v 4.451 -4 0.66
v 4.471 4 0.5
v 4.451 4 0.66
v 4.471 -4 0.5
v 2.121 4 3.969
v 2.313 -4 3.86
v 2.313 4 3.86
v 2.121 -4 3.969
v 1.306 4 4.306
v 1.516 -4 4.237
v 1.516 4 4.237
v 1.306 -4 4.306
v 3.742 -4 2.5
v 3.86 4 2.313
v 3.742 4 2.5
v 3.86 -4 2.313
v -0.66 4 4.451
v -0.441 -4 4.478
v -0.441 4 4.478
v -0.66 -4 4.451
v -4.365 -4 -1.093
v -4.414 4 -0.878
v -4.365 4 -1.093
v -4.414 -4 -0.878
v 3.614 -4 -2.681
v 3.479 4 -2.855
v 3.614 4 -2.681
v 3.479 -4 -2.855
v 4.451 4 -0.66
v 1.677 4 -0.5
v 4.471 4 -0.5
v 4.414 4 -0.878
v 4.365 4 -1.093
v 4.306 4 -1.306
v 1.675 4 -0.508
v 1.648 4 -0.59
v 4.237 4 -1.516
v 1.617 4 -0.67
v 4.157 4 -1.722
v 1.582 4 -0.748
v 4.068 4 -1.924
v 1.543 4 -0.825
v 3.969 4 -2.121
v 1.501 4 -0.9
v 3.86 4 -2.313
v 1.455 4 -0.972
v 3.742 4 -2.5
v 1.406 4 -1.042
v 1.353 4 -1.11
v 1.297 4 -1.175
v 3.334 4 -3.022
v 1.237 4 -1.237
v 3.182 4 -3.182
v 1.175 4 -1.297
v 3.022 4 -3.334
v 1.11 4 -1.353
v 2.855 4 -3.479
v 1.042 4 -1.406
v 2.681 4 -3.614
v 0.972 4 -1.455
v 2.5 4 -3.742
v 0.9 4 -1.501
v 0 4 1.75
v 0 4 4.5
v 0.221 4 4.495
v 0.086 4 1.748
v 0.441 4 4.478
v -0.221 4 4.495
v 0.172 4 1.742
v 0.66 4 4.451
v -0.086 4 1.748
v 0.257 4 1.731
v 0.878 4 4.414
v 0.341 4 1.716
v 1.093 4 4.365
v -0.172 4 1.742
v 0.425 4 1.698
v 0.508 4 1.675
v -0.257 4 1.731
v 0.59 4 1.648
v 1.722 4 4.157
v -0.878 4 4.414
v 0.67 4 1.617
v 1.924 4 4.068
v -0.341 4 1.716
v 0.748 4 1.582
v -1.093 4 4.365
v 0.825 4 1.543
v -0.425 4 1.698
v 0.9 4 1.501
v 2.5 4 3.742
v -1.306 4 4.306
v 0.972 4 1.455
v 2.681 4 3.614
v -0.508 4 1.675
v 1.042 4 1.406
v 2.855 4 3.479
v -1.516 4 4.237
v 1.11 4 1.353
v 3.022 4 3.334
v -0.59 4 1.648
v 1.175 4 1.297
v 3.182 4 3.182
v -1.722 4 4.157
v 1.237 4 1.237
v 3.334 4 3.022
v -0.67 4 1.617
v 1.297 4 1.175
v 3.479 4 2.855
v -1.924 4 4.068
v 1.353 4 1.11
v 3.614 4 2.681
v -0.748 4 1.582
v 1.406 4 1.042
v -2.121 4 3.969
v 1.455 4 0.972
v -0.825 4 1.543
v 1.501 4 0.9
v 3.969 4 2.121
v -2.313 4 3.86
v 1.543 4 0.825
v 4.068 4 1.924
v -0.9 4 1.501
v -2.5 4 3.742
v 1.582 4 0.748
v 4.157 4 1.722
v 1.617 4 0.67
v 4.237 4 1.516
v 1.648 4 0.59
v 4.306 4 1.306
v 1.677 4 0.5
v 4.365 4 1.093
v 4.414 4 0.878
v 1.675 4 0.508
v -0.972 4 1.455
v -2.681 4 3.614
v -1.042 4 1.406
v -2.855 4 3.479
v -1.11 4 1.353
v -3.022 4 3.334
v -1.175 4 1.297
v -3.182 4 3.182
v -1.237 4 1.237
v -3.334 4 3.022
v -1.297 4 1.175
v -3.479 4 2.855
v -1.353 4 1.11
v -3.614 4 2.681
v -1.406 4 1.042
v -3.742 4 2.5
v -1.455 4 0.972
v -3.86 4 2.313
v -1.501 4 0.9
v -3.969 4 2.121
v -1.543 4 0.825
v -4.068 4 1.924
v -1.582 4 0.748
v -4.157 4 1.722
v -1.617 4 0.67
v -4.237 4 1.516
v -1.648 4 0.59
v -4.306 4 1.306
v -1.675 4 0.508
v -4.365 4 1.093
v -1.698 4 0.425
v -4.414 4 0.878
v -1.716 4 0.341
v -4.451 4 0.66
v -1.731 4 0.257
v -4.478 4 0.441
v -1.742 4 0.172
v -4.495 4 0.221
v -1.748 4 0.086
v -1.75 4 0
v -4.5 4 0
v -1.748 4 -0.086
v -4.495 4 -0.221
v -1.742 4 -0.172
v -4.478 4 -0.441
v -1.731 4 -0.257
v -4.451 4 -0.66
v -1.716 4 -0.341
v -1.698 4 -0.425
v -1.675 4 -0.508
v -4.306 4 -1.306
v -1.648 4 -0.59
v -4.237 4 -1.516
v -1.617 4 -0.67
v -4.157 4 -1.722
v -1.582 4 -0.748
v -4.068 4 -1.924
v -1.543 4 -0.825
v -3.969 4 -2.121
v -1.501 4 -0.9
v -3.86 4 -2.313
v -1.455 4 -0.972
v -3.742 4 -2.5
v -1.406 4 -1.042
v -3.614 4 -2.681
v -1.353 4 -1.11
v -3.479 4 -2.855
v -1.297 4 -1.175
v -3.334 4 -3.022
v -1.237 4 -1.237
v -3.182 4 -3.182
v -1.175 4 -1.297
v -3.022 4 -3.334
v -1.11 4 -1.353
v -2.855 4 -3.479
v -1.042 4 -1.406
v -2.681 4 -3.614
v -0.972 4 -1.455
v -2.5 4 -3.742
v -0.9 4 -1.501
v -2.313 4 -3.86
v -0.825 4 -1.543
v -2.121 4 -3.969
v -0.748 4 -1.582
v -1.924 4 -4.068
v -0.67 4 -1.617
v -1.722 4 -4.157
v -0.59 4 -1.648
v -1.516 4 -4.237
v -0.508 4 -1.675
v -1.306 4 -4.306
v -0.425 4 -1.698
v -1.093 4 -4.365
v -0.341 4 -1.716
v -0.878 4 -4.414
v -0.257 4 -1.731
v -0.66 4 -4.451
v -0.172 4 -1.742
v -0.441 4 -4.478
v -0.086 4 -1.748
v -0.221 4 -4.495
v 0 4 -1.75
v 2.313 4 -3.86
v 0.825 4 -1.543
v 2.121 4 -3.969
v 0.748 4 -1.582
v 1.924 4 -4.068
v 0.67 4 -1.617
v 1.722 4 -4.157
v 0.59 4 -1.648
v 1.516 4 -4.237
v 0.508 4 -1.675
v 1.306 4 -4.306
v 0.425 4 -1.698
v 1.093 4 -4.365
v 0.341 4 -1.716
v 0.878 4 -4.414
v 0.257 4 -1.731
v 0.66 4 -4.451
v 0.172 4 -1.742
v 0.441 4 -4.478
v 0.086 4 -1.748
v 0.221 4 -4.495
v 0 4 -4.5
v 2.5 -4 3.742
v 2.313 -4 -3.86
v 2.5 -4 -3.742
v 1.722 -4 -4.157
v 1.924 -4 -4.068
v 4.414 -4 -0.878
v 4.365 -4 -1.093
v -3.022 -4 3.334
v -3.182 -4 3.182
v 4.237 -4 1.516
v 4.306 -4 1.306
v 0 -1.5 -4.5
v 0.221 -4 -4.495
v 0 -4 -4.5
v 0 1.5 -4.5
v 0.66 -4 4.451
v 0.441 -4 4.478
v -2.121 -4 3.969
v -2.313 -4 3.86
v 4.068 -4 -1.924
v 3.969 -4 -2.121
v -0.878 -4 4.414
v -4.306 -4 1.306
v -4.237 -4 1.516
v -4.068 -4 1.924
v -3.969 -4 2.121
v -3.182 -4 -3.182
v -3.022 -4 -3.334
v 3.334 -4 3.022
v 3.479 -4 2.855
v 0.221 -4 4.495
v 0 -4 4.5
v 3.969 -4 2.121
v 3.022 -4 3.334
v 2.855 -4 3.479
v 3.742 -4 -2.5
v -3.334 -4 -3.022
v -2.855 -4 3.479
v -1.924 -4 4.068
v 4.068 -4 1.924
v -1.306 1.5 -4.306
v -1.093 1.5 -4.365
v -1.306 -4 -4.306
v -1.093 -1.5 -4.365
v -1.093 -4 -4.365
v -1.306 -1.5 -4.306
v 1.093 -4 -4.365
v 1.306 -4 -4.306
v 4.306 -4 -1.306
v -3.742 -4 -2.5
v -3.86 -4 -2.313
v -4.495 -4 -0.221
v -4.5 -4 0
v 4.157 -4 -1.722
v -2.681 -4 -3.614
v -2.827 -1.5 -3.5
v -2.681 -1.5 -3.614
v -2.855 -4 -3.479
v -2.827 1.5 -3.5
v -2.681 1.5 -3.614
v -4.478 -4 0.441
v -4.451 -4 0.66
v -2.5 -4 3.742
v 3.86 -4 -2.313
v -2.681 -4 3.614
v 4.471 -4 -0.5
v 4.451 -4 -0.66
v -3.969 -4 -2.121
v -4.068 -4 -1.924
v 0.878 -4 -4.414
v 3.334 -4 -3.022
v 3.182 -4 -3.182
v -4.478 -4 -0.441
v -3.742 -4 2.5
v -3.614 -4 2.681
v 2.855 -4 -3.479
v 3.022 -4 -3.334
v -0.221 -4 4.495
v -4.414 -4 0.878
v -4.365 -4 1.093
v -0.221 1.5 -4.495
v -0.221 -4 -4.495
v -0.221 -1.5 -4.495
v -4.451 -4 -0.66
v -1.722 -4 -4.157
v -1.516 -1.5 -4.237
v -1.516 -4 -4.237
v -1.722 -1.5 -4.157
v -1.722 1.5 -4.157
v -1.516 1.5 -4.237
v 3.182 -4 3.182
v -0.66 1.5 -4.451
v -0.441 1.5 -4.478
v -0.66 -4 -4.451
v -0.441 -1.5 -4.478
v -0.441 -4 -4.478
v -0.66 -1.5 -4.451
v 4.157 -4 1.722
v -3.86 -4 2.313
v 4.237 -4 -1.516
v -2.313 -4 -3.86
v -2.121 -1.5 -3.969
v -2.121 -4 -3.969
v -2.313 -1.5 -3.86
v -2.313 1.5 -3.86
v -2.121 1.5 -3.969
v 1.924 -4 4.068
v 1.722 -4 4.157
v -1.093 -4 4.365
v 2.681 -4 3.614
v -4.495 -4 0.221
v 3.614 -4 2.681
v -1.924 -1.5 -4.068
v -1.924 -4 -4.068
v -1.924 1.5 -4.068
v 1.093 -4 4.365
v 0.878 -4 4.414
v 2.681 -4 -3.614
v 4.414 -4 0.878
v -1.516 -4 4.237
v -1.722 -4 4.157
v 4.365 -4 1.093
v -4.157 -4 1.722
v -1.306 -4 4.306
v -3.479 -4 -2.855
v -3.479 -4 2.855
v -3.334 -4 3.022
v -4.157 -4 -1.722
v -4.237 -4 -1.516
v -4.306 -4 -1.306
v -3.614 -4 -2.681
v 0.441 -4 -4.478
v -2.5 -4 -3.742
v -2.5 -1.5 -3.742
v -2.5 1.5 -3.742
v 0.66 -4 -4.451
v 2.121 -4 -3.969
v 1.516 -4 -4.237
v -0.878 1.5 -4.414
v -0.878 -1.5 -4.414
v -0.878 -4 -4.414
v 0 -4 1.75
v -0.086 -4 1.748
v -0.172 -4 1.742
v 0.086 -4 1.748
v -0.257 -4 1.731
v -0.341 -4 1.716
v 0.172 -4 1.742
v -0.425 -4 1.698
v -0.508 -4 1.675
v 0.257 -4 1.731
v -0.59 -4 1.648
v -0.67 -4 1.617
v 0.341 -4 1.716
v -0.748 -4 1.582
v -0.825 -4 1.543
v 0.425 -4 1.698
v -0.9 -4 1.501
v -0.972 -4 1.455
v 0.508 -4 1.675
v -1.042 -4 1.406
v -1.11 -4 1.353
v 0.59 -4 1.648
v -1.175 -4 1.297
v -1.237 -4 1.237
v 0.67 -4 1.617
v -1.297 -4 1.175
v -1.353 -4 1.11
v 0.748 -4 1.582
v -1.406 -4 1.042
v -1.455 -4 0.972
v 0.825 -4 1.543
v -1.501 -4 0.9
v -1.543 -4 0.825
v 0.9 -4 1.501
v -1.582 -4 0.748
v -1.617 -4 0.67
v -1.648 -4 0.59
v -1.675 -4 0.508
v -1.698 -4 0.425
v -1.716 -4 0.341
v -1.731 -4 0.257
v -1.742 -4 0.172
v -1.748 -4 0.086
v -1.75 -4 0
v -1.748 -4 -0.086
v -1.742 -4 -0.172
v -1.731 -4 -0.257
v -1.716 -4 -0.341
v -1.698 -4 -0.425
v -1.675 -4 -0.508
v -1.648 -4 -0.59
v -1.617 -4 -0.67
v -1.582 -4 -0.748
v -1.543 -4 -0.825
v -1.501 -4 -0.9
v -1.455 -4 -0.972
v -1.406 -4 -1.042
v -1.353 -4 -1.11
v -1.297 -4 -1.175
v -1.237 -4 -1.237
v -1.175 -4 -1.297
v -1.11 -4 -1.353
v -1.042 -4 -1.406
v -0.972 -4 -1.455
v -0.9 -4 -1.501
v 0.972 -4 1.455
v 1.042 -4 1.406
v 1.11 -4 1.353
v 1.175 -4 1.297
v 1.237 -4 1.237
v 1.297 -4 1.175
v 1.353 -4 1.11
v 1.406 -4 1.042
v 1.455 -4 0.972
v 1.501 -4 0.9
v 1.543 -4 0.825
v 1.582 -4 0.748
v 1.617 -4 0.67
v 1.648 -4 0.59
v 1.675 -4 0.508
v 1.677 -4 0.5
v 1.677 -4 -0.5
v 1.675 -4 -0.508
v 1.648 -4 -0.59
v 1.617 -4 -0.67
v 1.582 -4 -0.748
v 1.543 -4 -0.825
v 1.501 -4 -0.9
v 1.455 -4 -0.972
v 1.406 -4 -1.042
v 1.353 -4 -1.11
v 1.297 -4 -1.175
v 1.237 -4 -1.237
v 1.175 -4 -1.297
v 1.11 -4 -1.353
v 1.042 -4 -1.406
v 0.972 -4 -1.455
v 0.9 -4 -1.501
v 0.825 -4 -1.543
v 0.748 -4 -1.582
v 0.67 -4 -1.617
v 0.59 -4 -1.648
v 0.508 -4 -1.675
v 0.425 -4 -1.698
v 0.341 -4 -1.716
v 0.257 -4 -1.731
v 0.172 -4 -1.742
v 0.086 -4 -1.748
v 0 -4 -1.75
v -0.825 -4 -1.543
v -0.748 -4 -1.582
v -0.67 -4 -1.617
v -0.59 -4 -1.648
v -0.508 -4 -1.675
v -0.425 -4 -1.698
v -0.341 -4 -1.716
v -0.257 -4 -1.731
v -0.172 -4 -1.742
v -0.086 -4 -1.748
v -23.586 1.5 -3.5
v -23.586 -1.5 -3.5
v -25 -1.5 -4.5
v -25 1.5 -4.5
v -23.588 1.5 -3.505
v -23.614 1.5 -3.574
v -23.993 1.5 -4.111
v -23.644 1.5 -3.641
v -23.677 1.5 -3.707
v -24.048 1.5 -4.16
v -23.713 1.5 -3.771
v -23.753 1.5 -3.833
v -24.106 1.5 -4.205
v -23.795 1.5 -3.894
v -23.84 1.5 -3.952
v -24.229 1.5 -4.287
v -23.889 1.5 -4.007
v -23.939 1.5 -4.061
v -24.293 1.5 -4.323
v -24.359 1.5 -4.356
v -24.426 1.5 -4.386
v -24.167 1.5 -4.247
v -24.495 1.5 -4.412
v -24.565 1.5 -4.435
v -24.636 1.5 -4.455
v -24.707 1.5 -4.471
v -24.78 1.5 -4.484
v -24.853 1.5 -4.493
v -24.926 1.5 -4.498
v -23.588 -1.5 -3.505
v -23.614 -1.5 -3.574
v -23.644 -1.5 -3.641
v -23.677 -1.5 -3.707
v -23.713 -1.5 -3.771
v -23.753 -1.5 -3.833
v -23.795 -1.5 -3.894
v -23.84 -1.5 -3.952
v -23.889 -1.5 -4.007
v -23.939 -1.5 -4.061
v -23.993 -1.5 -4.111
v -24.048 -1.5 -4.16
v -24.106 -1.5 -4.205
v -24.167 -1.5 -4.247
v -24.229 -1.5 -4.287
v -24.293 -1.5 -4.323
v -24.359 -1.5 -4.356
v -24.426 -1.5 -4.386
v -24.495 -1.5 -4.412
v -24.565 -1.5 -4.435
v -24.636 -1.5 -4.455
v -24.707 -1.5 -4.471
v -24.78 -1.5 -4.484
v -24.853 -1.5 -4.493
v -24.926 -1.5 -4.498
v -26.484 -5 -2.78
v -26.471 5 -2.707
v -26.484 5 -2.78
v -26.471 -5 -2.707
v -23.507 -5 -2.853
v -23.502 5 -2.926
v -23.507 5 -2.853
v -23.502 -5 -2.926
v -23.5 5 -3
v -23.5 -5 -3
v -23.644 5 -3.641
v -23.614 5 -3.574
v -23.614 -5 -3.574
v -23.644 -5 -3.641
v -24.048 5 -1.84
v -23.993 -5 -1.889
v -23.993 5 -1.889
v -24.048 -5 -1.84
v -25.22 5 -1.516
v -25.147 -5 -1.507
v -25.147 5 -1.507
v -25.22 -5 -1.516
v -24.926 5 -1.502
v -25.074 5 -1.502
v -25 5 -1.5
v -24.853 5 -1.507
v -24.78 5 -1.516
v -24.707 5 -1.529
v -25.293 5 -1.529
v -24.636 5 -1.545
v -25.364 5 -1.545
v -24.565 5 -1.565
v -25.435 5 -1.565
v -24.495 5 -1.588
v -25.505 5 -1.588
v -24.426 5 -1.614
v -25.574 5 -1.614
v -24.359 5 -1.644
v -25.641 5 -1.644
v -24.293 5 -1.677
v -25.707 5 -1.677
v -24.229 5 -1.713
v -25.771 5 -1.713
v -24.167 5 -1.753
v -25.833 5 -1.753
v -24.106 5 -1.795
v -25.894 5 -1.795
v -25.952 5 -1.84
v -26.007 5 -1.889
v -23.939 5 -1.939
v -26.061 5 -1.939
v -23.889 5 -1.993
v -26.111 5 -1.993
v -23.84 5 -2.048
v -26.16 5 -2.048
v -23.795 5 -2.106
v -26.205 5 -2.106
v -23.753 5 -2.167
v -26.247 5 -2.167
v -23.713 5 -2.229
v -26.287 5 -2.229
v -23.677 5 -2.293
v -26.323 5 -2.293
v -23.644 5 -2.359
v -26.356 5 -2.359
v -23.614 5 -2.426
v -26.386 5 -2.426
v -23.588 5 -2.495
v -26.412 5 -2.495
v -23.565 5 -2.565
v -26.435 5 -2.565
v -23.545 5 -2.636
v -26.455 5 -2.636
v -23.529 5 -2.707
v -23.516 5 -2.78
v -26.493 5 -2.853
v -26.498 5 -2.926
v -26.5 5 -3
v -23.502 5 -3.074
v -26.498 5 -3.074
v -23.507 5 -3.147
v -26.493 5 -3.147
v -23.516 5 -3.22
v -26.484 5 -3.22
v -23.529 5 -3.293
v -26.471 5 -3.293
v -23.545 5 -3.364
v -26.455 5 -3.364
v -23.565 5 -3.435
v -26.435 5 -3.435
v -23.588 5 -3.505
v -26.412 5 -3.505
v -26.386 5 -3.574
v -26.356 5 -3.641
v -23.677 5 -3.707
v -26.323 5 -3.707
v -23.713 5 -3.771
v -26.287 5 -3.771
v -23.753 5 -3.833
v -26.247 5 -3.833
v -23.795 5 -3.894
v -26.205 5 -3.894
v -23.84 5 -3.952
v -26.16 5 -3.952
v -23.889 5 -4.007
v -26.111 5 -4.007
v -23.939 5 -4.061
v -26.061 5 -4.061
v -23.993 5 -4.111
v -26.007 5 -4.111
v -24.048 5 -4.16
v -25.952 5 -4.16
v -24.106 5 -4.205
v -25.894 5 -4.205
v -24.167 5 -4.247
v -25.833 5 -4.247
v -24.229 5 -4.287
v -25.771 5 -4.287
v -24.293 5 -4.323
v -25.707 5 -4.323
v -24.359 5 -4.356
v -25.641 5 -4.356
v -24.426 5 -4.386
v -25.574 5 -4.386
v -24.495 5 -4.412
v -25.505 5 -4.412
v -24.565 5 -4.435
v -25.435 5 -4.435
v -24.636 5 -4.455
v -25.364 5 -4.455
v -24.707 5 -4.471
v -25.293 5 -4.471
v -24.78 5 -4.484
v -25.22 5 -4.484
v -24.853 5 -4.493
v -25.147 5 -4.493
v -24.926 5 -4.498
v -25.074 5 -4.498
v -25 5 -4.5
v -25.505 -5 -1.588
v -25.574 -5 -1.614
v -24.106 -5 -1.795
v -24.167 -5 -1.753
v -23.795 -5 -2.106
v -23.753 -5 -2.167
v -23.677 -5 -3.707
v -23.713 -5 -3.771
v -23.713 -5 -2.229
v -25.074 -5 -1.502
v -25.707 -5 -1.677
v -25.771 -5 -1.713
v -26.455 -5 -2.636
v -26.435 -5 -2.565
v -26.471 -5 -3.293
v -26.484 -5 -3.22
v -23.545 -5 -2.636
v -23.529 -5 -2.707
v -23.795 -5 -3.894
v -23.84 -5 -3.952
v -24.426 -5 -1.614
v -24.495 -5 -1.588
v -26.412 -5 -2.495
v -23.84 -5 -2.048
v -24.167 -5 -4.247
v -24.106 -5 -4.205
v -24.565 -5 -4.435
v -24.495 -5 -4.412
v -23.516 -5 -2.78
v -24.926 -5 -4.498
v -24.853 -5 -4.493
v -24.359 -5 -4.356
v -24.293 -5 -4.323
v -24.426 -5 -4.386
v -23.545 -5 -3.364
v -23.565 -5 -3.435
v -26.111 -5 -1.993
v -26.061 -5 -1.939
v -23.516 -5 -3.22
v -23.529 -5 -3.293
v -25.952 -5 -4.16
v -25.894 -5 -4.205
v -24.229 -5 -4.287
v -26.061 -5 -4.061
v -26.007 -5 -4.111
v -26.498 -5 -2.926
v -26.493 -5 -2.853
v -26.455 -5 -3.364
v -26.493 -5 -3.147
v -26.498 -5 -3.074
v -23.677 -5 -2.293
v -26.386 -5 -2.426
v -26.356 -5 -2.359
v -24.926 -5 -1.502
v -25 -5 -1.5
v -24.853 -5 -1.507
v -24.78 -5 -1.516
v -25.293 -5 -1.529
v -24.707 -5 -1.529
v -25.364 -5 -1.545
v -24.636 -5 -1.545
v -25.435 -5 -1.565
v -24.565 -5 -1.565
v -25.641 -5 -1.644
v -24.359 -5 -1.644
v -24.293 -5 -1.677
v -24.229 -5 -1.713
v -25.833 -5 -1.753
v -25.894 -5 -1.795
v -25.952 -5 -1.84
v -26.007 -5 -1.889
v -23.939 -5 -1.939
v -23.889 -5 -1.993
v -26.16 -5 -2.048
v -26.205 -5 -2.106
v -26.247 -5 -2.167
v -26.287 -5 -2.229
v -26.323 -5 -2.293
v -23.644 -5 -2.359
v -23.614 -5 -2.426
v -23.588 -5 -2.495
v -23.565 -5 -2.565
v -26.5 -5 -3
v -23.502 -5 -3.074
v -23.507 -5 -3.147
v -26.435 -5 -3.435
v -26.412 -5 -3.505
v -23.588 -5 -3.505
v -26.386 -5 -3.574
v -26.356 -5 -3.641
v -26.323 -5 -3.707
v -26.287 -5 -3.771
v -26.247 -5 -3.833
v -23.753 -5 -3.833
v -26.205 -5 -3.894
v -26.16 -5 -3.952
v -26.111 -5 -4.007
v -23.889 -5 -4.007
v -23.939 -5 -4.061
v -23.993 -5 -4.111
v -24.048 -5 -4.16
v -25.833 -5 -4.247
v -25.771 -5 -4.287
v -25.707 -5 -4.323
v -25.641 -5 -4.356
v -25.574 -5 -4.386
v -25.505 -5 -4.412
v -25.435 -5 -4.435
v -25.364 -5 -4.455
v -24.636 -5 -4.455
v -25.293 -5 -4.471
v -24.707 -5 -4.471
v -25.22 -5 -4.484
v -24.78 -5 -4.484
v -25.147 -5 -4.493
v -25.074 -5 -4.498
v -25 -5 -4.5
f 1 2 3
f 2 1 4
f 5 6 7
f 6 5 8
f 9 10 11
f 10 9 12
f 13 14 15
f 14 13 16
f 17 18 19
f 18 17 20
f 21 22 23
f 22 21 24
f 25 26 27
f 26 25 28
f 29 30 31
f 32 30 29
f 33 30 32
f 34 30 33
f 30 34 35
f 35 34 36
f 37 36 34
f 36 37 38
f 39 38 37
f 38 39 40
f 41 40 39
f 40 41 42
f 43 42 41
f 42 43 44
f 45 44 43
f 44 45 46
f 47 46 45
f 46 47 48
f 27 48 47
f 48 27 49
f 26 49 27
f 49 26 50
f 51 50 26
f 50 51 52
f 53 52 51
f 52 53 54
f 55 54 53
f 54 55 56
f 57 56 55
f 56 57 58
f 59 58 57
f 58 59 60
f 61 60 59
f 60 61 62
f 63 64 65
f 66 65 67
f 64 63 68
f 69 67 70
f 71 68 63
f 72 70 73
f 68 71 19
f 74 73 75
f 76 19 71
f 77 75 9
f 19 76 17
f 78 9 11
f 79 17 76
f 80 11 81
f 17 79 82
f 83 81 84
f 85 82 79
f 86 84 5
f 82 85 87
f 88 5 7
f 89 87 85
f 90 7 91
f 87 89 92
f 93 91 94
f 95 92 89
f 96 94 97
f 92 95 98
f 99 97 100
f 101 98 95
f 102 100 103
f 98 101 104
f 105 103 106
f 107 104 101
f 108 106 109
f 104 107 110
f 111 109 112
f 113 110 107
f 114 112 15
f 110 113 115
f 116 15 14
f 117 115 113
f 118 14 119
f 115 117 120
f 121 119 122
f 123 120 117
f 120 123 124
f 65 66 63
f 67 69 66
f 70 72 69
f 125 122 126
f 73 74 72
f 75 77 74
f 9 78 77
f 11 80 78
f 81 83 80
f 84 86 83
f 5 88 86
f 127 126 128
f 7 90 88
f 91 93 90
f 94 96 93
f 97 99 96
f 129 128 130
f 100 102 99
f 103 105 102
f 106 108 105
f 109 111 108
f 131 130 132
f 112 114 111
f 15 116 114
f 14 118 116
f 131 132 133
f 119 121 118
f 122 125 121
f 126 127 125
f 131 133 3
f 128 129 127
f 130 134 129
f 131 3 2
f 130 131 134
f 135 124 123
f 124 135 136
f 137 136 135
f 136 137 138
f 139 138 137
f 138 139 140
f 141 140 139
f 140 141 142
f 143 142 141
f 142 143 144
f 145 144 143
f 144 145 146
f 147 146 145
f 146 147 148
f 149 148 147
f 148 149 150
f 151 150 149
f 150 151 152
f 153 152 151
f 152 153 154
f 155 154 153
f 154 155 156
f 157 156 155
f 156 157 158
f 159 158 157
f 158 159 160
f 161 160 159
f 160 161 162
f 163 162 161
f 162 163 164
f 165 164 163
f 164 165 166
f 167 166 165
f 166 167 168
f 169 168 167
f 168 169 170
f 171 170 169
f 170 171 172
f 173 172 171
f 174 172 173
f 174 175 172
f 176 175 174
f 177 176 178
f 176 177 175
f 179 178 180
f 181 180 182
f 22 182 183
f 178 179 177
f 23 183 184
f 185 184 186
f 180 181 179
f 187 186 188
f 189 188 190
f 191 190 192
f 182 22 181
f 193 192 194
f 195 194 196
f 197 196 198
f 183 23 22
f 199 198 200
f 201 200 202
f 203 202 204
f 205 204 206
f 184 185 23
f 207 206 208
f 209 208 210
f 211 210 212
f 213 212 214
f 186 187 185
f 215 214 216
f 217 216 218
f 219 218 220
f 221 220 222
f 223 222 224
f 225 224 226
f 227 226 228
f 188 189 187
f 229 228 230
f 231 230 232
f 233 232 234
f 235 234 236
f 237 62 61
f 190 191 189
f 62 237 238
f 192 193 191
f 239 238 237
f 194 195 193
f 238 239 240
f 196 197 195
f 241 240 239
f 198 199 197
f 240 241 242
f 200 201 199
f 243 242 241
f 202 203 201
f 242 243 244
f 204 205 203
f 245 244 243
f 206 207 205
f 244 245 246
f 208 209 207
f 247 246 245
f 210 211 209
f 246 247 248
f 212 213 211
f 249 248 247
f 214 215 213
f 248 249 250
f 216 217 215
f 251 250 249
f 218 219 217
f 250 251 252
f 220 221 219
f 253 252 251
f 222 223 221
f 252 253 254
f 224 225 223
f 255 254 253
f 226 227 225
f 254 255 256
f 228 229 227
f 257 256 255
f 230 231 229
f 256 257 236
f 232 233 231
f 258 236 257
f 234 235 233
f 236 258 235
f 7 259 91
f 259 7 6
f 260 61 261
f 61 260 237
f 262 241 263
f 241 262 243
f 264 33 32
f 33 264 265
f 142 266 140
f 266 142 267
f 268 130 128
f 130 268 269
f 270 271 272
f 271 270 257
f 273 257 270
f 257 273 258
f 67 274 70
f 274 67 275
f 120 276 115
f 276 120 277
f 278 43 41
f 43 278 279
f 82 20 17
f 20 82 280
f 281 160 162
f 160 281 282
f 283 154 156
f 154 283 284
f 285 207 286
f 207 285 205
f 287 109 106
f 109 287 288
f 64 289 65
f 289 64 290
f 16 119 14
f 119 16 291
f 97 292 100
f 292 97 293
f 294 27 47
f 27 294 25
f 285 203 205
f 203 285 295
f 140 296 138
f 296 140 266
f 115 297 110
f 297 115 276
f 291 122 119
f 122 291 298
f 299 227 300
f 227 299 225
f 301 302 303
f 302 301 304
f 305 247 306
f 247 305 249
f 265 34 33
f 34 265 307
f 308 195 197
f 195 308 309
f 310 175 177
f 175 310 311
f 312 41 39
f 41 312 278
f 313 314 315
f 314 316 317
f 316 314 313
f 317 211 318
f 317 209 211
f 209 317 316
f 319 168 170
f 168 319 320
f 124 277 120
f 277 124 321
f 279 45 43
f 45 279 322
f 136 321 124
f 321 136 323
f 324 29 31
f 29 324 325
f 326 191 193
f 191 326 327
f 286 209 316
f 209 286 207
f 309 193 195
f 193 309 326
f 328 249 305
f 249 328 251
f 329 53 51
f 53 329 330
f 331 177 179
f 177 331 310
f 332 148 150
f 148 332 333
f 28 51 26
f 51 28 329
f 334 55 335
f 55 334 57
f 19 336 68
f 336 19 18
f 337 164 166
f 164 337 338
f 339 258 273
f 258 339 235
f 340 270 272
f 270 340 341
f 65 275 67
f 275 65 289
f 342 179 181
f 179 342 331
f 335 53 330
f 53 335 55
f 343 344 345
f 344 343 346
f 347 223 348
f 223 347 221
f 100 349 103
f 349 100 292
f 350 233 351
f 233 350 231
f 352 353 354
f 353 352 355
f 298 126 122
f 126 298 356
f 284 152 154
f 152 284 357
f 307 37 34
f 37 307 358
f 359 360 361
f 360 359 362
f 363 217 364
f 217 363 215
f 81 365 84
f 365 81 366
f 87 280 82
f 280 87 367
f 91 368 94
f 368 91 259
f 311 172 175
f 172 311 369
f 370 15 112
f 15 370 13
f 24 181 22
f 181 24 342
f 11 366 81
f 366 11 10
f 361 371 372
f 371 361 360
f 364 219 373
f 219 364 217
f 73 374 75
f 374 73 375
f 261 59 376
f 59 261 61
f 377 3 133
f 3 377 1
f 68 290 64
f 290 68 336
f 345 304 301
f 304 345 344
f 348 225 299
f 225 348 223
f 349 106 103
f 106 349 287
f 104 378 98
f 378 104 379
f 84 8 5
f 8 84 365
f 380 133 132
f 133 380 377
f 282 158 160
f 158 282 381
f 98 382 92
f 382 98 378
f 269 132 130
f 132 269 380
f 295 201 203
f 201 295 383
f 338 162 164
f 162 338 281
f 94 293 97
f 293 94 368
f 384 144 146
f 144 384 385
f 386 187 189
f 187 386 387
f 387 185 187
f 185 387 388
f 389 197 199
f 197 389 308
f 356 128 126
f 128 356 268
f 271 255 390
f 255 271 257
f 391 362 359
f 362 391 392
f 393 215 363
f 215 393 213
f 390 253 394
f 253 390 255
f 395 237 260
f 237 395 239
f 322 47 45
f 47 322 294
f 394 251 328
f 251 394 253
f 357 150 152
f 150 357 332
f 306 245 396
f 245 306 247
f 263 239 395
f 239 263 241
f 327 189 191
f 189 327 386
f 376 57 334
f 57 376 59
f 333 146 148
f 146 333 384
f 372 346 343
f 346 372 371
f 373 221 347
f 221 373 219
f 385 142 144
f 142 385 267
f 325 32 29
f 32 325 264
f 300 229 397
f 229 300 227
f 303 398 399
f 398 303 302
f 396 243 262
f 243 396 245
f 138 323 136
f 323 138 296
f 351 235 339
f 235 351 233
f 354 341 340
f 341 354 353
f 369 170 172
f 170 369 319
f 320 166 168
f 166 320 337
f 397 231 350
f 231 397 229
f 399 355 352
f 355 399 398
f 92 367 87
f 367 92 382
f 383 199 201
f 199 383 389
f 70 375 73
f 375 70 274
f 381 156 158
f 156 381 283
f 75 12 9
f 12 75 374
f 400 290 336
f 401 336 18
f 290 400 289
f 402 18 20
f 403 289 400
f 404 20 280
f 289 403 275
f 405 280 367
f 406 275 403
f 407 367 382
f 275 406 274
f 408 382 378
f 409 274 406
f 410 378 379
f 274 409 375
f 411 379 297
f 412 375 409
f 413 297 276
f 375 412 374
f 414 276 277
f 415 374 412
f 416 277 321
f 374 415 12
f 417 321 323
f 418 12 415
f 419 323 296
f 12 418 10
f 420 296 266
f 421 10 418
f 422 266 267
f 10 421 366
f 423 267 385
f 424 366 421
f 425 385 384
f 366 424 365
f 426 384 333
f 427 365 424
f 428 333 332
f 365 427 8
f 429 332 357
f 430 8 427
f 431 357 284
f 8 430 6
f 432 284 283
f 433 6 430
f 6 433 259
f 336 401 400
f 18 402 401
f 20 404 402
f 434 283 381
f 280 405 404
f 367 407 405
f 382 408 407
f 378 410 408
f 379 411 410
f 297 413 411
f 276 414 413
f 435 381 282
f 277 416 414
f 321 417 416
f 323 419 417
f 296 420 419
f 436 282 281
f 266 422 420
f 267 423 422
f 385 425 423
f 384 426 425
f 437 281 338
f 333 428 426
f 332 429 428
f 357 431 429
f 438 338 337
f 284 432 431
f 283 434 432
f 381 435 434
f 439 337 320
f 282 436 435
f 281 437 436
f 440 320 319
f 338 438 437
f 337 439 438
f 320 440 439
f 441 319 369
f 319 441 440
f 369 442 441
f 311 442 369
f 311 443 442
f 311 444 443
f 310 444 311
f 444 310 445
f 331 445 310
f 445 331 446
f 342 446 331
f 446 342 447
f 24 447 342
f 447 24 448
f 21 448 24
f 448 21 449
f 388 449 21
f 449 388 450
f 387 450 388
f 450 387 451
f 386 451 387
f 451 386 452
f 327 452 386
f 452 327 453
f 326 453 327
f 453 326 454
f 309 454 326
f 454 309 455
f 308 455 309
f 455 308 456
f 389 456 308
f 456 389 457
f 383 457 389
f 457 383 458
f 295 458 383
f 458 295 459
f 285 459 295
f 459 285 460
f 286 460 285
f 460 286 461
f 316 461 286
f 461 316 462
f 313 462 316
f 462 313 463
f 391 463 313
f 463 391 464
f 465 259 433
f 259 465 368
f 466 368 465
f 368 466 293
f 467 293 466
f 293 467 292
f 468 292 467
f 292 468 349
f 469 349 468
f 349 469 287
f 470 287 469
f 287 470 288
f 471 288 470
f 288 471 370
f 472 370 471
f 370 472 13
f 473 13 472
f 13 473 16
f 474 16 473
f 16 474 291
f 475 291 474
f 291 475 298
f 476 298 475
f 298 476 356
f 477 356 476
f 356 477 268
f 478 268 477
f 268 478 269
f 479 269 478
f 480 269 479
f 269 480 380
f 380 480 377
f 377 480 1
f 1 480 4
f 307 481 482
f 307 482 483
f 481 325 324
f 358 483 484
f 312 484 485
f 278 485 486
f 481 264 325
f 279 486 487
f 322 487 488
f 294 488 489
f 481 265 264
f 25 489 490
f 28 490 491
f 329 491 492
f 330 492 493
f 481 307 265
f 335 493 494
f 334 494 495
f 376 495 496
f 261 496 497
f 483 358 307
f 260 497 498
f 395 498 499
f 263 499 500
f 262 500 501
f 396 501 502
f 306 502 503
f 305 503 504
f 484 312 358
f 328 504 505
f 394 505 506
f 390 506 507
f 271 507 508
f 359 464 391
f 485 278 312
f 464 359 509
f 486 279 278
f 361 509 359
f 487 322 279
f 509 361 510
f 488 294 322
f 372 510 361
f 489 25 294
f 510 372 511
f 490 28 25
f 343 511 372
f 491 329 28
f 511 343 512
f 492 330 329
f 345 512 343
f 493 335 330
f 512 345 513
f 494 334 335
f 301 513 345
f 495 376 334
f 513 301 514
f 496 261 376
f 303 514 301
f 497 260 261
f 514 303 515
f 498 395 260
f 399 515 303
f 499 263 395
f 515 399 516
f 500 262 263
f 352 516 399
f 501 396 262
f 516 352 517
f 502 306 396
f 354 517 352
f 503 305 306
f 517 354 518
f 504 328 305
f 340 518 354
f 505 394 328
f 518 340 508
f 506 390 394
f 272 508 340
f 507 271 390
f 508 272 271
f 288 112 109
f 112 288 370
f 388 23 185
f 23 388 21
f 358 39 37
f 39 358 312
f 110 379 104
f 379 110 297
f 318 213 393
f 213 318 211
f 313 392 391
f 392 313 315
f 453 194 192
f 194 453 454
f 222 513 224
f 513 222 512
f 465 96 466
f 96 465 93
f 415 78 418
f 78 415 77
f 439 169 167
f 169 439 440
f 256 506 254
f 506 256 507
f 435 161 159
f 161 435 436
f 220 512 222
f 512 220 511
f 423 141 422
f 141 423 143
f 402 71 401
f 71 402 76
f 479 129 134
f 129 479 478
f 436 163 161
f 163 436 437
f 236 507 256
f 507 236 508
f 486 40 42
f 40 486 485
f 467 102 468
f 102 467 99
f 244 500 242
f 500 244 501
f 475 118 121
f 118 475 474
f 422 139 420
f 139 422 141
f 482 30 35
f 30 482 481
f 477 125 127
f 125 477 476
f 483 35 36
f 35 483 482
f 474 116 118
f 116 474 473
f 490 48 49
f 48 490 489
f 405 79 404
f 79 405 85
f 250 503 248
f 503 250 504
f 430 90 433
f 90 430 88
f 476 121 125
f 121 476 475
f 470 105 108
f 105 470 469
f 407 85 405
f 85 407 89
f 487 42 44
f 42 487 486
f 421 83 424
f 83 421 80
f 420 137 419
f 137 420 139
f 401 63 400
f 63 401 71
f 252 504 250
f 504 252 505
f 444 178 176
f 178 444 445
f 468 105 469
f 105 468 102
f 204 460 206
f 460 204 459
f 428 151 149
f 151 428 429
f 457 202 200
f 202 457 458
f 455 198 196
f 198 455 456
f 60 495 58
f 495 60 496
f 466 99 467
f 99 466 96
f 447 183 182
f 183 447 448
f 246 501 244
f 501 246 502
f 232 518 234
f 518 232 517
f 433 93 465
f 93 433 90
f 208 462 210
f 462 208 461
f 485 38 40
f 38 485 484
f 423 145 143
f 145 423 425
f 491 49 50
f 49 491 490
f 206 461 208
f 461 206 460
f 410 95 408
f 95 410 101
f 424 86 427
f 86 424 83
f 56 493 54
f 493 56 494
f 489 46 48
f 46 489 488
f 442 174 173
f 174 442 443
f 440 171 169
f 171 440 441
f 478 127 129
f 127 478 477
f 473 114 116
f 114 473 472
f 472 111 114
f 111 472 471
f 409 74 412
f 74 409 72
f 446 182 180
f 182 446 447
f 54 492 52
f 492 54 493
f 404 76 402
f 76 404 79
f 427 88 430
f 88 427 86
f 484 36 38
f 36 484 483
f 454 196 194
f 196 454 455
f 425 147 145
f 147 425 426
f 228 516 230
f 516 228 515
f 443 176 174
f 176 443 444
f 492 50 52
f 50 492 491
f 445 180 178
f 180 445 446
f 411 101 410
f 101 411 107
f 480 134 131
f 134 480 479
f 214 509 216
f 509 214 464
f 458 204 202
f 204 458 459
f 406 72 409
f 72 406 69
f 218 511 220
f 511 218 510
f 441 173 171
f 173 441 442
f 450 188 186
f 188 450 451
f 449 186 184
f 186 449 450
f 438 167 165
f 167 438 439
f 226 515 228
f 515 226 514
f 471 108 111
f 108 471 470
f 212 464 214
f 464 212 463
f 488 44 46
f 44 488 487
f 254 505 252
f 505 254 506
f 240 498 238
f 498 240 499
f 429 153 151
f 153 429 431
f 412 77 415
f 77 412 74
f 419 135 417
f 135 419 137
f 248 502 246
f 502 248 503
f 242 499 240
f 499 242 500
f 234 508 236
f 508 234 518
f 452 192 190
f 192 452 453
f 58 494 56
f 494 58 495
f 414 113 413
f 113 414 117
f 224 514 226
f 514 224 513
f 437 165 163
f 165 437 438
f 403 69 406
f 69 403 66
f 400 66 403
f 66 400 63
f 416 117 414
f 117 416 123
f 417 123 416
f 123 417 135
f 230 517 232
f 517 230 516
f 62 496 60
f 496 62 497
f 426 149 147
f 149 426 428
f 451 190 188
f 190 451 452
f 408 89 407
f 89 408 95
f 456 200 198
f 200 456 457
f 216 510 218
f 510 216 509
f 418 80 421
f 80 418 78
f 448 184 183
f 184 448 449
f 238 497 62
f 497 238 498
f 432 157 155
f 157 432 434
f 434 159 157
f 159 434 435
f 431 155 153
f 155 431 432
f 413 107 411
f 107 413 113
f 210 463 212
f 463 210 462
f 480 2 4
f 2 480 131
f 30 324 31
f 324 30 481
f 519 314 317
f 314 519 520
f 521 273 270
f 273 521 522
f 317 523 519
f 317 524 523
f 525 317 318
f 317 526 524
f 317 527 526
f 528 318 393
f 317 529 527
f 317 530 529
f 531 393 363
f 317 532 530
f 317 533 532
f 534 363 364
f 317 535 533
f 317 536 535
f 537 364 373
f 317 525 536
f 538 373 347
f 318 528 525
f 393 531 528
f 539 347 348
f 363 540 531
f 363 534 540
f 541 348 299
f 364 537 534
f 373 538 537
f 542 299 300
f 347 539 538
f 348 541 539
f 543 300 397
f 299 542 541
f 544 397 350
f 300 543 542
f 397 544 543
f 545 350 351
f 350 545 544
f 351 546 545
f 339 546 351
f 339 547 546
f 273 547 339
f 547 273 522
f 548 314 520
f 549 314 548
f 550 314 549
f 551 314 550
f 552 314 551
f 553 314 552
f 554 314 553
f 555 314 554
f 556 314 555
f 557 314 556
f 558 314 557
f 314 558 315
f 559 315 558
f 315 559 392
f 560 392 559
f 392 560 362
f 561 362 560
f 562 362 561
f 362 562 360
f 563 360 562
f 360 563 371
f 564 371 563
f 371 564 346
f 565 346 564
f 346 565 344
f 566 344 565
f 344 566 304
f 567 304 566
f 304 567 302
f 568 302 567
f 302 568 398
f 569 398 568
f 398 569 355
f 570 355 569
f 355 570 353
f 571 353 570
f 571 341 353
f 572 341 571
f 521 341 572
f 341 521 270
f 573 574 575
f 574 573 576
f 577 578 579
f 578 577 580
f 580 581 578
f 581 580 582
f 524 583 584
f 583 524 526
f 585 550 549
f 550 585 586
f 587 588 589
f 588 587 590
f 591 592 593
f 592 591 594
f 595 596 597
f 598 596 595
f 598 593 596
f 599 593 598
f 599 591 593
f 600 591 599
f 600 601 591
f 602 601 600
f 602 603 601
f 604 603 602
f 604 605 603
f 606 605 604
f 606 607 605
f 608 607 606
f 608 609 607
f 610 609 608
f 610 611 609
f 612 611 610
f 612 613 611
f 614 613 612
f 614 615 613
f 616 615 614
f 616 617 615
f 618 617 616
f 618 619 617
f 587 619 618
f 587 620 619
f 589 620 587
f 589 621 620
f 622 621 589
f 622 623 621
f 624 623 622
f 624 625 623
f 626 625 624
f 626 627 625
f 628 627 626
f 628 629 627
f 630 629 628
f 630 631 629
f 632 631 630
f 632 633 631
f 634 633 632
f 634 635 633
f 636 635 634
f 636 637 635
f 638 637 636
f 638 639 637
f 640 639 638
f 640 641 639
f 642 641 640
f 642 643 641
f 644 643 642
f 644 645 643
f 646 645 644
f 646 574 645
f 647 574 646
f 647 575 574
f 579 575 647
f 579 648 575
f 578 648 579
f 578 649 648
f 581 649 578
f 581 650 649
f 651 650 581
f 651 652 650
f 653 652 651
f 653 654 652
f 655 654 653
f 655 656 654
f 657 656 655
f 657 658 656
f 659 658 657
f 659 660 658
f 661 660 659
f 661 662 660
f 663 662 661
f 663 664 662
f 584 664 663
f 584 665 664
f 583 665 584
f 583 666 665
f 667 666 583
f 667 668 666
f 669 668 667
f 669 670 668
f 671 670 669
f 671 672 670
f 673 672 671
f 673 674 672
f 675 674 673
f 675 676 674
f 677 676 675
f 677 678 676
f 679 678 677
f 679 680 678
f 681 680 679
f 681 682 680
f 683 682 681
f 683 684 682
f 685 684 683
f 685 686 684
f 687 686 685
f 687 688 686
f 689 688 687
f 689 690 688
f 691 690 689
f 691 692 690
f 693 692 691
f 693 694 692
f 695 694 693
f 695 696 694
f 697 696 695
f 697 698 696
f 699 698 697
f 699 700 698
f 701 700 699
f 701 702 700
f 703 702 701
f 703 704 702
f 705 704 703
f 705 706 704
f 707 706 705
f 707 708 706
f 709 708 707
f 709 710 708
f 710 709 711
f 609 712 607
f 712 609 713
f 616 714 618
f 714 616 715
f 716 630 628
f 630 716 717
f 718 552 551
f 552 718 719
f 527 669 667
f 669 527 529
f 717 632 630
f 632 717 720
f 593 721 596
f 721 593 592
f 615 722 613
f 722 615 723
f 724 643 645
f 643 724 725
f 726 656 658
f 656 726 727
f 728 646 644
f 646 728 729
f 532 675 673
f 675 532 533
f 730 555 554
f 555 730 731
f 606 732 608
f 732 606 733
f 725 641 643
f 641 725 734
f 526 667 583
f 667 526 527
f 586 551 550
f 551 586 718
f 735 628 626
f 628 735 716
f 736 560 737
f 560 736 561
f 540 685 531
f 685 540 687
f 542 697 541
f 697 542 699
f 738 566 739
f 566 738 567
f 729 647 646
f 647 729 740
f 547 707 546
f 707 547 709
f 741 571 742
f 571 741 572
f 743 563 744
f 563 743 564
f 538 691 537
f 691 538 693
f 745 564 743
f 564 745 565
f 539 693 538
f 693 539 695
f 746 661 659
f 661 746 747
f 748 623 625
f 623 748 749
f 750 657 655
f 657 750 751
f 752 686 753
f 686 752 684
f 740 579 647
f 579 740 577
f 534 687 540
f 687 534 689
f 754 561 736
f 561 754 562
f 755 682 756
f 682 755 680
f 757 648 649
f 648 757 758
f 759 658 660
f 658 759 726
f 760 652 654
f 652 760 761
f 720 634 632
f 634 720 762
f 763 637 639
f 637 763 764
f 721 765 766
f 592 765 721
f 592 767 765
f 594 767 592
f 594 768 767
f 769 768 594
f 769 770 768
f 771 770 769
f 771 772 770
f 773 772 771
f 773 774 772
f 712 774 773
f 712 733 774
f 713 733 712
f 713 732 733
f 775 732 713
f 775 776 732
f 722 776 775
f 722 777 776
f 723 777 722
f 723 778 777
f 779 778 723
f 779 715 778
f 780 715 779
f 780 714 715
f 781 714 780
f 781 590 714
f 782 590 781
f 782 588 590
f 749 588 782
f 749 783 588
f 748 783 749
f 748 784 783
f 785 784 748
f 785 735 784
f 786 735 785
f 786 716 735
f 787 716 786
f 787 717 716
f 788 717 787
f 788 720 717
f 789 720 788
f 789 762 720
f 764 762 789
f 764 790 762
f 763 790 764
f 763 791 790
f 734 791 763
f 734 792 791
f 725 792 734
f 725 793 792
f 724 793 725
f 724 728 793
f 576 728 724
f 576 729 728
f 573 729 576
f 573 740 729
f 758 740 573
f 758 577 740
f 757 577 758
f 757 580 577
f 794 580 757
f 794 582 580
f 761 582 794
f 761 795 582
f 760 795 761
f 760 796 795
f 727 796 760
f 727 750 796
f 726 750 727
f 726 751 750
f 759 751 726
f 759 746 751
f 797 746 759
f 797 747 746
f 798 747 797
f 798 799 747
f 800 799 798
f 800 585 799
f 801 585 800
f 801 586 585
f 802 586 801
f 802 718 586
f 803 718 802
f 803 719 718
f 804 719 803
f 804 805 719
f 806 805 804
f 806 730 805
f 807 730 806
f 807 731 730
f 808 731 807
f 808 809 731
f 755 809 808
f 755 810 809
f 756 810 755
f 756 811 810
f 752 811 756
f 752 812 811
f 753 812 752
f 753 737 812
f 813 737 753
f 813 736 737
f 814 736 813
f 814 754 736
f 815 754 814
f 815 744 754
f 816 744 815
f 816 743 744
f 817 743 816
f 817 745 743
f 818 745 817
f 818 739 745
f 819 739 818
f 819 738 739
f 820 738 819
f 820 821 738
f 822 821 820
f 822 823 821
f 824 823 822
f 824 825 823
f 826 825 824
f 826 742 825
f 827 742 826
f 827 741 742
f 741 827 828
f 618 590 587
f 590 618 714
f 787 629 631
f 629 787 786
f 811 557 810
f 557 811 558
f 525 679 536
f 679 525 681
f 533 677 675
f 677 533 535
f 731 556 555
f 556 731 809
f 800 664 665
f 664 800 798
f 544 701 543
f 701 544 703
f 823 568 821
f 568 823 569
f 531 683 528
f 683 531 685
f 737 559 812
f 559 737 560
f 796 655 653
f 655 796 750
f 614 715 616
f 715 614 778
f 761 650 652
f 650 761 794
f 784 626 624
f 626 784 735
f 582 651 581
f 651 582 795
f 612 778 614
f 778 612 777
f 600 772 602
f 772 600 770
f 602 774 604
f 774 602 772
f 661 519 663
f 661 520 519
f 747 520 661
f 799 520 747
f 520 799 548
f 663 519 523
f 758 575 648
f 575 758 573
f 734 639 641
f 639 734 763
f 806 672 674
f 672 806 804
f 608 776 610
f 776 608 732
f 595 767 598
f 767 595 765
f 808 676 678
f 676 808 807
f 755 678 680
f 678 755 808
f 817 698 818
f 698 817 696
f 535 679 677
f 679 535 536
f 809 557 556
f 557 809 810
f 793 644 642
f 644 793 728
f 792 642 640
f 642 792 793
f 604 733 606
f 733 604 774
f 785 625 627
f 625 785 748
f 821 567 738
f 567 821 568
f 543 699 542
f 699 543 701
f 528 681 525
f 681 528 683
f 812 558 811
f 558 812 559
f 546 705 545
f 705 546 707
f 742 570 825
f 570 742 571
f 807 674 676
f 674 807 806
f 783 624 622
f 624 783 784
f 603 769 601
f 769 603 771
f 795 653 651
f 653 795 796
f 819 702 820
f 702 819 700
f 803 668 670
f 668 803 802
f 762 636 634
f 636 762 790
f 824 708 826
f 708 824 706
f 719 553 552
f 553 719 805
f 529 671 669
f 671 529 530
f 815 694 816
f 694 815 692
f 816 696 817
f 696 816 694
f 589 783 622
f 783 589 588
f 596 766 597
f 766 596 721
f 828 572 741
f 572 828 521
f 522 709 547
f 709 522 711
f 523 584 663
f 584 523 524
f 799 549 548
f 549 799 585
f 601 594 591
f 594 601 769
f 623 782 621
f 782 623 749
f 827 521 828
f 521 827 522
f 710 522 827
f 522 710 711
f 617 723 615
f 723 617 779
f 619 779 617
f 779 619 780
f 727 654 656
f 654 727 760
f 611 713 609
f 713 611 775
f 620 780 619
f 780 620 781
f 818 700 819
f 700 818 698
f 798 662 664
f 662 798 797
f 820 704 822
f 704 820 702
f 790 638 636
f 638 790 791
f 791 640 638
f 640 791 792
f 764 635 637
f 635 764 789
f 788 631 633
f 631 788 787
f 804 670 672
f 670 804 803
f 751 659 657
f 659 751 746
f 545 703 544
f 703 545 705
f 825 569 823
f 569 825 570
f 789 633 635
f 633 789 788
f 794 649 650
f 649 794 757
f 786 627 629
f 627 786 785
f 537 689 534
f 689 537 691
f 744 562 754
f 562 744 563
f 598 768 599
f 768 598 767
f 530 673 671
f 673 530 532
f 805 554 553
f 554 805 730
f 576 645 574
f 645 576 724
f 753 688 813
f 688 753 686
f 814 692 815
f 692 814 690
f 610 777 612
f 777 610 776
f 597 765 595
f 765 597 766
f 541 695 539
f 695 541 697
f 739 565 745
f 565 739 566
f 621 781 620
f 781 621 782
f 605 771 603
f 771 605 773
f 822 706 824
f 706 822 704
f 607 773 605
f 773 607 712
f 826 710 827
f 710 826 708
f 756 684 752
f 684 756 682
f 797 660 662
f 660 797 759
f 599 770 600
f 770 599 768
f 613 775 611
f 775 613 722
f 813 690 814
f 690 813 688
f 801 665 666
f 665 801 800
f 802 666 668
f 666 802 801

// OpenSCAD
// Cuff Prototype for Shokz Fit Adjustment Strap
$fn = $preview ? 32 : 128;

// --- Parameters --- //

// --- Modules --- //

module cuff_with_strap_fastener(
    // Cuff Body
    cuff_inner_diameter = 3.5,
    cuff_outer_diameter = 9,
    cuff_height = 8,
    cuff_gap = 1,
    // Integrated Strap
    fastener_strap_length = 25,
    fastener_strap_width = 3,
    fastener_strap_thickness = 1,
    // Fastening Bar
    bar_diameter = 3,
    bar_length = 10
) {
    union() {
        // The main C-shaped cuff body, centered at the origin
        rotate([90, 0, 0]) 
            cuff_body(cuff_height, cuff_outer_diameter, cuff_inner_diameter, cuff_gap);

        // The main length of the flexible strap, extending from the cuff's edge
        translate([-(fastener_strap_length/2), 0,  -(cuff_outer_diameter/2 - fastener_strap_thickness/2)])
            cube([fastener_strap_length, fastener_strap_width, fastener_strap_thickness], center=true);

        // The T-bar at the end of the strap
        translate([-fastener_strap_length, 0, -(cuff_outer_diameter/2 - bar_diameter/2)])
            rotate([90, 0, 0])
                cylinder(h=bar_length, d=bar_diameter, center=true);
    }
}

module cuff_body(height, outer_d, inner_d, gap) {
    difference() {
        cylinder(h=height, d=outer_d, center=true);
        cylinder(h=height + 1, d=inner_d, center=true);
        translate([outer_d/2, 0, 0])
            cube([outer_d, gap, height+1], center=true);
    }
}

// Render the cuff for prototyping
cuff_with_strap_fastener();
